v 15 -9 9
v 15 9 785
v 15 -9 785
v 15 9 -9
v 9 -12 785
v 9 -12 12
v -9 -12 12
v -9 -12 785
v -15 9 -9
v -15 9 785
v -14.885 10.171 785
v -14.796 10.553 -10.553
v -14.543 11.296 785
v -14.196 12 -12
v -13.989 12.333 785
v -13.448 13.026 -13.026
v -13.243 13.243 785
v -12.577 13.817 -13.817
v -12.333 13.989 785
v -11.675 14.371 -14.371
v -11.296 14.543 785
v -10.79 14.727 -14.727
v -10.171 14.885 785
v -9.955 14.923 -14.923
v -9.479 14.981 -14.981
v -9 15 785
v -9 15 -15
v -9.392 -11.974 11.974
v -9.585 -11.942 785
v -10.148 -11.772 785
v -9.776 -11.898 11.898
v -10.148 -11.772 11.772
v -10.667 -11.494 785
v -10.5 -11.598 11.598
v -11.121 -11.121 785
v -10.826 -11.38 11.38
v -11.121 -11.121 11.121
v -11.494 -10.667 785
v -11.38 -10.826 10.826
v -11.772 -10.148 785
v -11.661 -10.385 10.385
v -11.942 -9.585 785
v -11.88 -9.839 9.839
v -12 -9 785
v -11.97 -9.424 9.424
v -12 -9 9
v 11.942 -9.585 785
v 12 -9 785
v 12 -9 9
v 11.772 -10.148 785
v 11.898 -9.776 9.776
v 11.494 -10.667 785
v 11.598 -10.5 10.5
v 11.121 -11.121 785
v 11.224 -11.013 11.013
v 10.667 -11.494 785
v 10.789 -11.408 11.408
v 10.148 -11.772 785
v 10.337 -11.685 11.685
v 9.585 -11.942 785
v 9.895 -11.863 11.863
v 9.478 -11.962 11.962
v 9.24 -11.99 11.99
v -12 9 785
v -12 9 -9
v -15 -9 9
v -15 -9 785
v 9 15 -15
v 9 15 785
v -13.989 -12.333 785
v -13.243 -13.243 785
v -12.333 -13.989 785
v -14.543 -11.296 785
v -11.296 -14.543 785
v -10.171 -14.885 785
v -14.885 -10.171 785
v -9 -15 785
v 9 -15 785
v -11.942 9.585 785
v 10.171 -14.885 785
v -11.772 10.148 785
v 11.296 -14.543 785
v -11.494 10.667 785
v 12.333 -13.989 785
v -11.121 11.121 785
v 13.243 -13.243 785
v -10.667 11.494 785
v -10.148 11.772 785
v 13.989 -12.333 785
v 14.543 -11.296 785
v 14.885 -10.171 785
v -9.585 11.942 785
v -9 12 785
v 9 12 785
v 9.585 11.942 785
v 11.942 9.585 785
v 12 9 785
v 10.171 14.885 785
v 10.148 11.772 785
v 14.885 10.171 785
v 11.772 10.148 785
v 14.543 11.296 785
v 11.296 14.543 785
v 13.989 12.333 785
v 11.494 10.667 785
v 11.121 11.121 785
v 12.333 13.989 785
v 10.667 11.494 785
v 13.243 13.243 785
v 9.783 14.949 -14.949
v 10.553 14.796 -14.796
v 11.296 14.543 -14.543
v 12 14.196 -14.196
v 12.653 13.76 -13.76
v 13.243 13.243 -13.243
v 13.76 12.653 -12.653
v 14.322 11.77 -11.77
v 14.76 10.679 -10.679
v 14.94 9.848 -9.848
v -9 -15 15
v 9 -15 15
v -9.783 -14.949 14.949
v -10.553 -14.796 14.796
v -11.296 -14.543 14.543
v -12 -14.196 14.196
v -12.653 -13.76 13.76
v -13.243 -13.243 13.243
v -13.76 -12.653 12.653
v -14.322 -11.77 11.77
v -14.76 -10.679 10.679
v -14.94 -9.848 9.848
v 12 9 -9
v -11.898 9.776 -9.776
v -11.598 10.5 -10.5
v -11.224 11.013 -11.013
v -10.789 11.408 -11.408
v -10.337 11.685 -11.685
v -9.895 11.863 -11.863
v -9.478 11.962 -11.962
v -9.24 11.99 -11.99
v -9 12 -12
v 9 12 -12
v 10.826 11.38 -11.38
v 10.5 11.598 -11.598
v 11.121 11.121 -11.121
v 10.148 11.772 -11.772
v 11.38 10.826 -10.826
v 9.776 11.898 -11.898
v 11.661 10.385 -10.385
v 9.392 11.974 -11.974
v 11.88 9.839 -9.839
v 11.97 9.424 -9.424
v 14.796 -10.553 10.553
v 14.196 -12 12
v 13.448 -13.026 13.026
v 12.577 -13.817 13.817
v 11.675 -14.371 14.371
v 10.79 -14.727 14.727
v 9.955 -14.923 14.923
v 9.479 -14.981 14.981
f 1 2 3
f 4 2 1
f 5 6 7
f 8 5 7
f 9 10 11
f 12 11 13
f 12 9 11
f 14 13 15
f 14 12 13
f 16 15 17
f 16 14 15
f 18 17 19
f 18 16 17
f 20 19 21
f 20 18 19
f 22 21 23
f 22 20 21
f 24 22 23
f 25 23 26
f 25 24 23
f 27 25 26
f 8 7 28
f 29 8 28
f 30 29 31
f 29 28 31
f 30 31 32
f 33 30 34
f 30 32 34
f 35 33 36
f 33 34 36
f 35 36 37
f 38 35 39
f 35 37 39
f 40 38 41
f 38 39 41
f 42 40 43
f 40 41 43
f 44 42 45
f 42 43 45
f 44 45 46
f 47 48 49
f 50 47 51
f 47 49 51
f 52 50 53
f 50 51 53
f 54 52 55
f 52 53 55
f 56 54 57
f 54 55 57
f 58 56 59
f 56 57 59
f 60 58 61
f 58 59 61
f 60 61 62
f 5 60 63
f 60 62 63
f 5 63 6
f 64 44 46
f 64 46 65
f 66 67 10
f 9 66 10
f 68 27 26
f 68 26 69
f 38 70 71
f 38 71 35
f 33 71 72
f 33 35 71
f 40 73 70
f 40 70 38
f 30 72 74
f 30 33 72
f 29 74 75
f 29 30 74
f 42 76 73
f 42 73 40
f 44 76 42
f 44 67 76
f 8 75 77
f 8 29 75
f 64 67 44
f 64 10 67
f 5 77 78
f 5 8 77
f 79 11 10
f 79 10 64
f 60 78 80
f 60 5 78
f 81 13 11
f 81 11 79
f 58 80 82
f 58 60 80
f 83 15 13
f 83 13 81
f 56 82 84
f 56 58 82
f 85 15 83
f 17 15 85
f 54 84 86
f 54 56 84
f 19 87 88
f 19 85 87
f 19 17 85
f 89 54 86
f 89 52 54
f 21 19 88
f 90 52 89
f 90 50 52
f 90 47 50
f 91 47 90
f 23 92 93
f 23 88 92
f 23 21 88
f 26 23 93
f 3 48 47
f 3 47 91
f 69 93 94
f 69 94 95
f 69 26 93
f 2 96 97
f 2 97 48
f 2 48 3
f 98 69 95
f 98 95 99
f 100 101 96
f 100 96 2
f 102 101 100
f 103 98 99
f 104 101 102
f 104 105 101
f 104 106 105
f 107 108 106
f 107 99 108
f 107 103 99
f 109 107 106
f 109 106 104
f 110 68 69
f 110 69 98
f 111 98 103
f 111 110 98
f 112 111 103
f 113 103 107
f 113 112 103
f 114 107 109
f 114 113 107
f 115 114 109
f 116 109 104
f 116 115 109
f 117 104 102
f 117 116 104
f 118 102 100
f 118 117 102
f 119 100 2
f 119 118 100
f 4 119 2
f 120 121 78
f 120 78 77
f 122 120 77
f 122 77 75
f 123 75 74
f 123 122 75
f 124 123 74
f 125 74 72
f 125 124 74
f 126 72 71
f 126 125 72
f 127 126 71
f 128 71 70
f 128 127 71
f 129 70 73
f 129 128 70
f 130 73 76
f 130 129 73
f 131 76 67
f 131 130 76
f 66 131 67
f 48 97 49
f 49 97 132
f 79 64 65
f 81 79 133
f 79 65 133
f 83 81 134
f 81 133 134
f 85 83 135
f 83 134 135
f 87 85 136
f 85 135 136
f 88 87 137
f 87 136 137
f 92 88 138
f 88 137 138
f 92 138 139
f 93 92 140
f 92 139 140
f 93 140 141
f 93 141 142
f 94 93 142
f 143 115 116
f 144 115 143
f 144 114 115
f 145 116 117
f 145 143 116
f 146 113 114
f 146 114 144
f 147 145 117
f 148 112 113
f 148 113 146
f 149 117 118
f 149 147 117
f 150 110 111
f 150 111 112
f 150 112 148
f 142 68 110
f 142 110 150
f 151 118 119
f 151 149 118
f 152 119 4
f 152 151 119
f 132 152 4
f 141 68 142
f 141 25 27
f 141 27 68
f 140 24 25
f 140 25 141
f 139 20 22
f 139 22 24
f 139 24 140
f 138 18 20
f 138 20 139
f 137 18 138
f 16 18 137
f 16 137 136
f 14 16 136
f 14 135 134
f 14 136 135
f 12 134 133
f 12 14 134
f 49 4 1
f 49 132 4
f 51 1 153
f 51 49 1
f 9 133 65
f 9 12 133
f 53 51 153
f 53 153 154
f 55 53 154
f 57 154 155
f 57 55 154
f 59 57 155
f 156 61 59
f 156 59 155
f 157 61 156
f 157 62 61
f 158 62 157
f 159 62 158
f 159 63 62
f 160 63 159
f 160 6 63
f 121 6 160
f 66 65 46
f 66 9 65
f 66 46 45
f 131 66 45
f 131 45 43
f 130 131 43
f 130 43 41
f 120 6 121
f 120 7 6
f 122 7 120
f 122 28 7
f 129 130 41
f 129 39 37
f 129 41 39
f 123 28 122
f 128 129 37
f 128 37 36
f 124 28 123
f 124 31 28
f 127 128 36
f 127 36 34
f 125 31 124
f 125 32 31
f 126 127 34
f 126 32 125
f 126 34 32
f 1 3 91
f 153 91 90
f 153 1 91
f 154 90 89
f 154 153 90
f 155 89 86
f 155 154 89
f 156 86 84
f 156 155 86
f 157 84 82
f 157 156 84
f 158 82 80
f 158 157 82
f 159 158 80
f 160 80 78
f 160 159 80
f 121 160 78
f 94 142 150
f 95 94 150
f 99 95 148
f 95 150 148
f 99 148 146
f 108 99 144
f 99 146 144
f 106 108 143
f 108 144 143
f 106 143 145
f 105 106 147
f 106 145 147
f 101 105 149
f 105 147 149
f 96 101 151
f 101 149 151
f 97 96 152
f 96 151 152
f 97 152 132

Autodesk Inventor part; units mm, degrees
ref_plane "Start Plane" through (0, 0, -15) normal (0, 0, 1) x (1, 0, 0)
ref_plane "End Plane" through (0, 0, 785) normal (0, 0, 1) x (1, 0, 0)
sketch "Sketch" plane through (0, 0, 0) normal (0, 0, 1) x (1, 0, 0)
  line L0 (-15, -9) -> (-15, 9)
  line L1 (-9, 15) -> (9, 15)
  line L2 (15, 9) -> (15, -9)
  line L3 (9, -15) -> (-9, -15)
  arc A0 (-15, -9) -> (-9, -15) centre (-9, -9) ccw
  arc A1 (-9, 15) -> (-15, 9) centre (-9, 9) ccw
  arc A2 (15, 9) -> (9, 15) centre (9, 9) ccw
  arc A3 (9, -15) -> (15, -9) centre (9, -9) ccw
  arc A4 (-9, 12) -> (-12, 9) centre (-9, 9) ccw
  line L4 (-9, 12) -> (9, 12)
  arc A5 (12, 9) -> (9, 12) centre (9, 9) ccw
  line L5 (12, 9) -> (12, -9)
  arc A6 (9, -12) -> (12, -9) centre (9, -9) ccw
  line L6 (9, -12) -> (-9, -12)
  arc A7 (-12, -9) -> (-9, -12) centre (-9, -9) ccw
  line L7 (-12, -9) -> (-12, 9)
  line L8 (0, 22.7397) -> (0, -22.7397) construction
  line L9 (-22.7397, 0) -> (22.7397, 0) construction
  dimension "d7" = 6
  dimension "d10" = 30
  dimension "d11" = 30
  dimension "d12" = 3
  dimension "d15" = 15
  dimension "d16" = 15
extrude "Body" add sketch "Sketch" along normal up to surface (800 mm away) from surface at -15
sketch "Sketch3" plane through (0, 0, 0) normal (0, 0, 1) x (1, 0, 0)
  line L0 (0, 0) -> (10, 0)
ref_plane "Work Plane3" through (0, 0, 0) normal (0, -1, 0) x (1, 0, 0)
ref_plane "Work Plane4" through (0, 15, -15) normal (0, -0.7071, -0.7071) x (1, 0, 0)
split "Split1" plane through (0, 15, -15) removes the side toward (0, -0.7071, -0.7071)
ref_plane "Work Plane5" through (9, 500, 785) normal (0, 0, 1) x (1, 0, 0)
split "Split2" plane through (9, 500, 785) removes the side toward (0, 0, 1)
sketch "Sketch4" plane through (0, 0, 0) normal (0, -1, 0) x (1, 0, 0)
  line L0 (-2, -15) -> (12, -15) projected
  line L1 (-2, 785) -> (12, 785) projected
  dimension "d18" = 800
equation "\"d7\" = G_IR"
equation "\"d10\" = G_H"
equation "\"d11\" = G_W"
equation "\"d12\" = G_T"
equation "\"d15\" = 0.5 * d10"
equation "\"d16\" = 0.5 * d11"
equation "\"d3\" = G_L"
equation "\"G_W\" = 30"
equation "\"G_H\" = 30"
equation "\"G_T\" = 3"
equation "\"G_IR\" = 6"
equation "\"G_L\" = d18"
equation "\"G_OFFSET_START\" = 15"
equation "\"G_OFFSET_END\" = -15"
equation "\"d13\" = -G_OFFSET_START"
equation "\"d14\" = G_OFFSET_END + B_L"
equation "\"B_L\" = 800"
properties part number "DIN EN 10219-2 - 30 x 30 x 3  - 800" material "Steel, Mild"
